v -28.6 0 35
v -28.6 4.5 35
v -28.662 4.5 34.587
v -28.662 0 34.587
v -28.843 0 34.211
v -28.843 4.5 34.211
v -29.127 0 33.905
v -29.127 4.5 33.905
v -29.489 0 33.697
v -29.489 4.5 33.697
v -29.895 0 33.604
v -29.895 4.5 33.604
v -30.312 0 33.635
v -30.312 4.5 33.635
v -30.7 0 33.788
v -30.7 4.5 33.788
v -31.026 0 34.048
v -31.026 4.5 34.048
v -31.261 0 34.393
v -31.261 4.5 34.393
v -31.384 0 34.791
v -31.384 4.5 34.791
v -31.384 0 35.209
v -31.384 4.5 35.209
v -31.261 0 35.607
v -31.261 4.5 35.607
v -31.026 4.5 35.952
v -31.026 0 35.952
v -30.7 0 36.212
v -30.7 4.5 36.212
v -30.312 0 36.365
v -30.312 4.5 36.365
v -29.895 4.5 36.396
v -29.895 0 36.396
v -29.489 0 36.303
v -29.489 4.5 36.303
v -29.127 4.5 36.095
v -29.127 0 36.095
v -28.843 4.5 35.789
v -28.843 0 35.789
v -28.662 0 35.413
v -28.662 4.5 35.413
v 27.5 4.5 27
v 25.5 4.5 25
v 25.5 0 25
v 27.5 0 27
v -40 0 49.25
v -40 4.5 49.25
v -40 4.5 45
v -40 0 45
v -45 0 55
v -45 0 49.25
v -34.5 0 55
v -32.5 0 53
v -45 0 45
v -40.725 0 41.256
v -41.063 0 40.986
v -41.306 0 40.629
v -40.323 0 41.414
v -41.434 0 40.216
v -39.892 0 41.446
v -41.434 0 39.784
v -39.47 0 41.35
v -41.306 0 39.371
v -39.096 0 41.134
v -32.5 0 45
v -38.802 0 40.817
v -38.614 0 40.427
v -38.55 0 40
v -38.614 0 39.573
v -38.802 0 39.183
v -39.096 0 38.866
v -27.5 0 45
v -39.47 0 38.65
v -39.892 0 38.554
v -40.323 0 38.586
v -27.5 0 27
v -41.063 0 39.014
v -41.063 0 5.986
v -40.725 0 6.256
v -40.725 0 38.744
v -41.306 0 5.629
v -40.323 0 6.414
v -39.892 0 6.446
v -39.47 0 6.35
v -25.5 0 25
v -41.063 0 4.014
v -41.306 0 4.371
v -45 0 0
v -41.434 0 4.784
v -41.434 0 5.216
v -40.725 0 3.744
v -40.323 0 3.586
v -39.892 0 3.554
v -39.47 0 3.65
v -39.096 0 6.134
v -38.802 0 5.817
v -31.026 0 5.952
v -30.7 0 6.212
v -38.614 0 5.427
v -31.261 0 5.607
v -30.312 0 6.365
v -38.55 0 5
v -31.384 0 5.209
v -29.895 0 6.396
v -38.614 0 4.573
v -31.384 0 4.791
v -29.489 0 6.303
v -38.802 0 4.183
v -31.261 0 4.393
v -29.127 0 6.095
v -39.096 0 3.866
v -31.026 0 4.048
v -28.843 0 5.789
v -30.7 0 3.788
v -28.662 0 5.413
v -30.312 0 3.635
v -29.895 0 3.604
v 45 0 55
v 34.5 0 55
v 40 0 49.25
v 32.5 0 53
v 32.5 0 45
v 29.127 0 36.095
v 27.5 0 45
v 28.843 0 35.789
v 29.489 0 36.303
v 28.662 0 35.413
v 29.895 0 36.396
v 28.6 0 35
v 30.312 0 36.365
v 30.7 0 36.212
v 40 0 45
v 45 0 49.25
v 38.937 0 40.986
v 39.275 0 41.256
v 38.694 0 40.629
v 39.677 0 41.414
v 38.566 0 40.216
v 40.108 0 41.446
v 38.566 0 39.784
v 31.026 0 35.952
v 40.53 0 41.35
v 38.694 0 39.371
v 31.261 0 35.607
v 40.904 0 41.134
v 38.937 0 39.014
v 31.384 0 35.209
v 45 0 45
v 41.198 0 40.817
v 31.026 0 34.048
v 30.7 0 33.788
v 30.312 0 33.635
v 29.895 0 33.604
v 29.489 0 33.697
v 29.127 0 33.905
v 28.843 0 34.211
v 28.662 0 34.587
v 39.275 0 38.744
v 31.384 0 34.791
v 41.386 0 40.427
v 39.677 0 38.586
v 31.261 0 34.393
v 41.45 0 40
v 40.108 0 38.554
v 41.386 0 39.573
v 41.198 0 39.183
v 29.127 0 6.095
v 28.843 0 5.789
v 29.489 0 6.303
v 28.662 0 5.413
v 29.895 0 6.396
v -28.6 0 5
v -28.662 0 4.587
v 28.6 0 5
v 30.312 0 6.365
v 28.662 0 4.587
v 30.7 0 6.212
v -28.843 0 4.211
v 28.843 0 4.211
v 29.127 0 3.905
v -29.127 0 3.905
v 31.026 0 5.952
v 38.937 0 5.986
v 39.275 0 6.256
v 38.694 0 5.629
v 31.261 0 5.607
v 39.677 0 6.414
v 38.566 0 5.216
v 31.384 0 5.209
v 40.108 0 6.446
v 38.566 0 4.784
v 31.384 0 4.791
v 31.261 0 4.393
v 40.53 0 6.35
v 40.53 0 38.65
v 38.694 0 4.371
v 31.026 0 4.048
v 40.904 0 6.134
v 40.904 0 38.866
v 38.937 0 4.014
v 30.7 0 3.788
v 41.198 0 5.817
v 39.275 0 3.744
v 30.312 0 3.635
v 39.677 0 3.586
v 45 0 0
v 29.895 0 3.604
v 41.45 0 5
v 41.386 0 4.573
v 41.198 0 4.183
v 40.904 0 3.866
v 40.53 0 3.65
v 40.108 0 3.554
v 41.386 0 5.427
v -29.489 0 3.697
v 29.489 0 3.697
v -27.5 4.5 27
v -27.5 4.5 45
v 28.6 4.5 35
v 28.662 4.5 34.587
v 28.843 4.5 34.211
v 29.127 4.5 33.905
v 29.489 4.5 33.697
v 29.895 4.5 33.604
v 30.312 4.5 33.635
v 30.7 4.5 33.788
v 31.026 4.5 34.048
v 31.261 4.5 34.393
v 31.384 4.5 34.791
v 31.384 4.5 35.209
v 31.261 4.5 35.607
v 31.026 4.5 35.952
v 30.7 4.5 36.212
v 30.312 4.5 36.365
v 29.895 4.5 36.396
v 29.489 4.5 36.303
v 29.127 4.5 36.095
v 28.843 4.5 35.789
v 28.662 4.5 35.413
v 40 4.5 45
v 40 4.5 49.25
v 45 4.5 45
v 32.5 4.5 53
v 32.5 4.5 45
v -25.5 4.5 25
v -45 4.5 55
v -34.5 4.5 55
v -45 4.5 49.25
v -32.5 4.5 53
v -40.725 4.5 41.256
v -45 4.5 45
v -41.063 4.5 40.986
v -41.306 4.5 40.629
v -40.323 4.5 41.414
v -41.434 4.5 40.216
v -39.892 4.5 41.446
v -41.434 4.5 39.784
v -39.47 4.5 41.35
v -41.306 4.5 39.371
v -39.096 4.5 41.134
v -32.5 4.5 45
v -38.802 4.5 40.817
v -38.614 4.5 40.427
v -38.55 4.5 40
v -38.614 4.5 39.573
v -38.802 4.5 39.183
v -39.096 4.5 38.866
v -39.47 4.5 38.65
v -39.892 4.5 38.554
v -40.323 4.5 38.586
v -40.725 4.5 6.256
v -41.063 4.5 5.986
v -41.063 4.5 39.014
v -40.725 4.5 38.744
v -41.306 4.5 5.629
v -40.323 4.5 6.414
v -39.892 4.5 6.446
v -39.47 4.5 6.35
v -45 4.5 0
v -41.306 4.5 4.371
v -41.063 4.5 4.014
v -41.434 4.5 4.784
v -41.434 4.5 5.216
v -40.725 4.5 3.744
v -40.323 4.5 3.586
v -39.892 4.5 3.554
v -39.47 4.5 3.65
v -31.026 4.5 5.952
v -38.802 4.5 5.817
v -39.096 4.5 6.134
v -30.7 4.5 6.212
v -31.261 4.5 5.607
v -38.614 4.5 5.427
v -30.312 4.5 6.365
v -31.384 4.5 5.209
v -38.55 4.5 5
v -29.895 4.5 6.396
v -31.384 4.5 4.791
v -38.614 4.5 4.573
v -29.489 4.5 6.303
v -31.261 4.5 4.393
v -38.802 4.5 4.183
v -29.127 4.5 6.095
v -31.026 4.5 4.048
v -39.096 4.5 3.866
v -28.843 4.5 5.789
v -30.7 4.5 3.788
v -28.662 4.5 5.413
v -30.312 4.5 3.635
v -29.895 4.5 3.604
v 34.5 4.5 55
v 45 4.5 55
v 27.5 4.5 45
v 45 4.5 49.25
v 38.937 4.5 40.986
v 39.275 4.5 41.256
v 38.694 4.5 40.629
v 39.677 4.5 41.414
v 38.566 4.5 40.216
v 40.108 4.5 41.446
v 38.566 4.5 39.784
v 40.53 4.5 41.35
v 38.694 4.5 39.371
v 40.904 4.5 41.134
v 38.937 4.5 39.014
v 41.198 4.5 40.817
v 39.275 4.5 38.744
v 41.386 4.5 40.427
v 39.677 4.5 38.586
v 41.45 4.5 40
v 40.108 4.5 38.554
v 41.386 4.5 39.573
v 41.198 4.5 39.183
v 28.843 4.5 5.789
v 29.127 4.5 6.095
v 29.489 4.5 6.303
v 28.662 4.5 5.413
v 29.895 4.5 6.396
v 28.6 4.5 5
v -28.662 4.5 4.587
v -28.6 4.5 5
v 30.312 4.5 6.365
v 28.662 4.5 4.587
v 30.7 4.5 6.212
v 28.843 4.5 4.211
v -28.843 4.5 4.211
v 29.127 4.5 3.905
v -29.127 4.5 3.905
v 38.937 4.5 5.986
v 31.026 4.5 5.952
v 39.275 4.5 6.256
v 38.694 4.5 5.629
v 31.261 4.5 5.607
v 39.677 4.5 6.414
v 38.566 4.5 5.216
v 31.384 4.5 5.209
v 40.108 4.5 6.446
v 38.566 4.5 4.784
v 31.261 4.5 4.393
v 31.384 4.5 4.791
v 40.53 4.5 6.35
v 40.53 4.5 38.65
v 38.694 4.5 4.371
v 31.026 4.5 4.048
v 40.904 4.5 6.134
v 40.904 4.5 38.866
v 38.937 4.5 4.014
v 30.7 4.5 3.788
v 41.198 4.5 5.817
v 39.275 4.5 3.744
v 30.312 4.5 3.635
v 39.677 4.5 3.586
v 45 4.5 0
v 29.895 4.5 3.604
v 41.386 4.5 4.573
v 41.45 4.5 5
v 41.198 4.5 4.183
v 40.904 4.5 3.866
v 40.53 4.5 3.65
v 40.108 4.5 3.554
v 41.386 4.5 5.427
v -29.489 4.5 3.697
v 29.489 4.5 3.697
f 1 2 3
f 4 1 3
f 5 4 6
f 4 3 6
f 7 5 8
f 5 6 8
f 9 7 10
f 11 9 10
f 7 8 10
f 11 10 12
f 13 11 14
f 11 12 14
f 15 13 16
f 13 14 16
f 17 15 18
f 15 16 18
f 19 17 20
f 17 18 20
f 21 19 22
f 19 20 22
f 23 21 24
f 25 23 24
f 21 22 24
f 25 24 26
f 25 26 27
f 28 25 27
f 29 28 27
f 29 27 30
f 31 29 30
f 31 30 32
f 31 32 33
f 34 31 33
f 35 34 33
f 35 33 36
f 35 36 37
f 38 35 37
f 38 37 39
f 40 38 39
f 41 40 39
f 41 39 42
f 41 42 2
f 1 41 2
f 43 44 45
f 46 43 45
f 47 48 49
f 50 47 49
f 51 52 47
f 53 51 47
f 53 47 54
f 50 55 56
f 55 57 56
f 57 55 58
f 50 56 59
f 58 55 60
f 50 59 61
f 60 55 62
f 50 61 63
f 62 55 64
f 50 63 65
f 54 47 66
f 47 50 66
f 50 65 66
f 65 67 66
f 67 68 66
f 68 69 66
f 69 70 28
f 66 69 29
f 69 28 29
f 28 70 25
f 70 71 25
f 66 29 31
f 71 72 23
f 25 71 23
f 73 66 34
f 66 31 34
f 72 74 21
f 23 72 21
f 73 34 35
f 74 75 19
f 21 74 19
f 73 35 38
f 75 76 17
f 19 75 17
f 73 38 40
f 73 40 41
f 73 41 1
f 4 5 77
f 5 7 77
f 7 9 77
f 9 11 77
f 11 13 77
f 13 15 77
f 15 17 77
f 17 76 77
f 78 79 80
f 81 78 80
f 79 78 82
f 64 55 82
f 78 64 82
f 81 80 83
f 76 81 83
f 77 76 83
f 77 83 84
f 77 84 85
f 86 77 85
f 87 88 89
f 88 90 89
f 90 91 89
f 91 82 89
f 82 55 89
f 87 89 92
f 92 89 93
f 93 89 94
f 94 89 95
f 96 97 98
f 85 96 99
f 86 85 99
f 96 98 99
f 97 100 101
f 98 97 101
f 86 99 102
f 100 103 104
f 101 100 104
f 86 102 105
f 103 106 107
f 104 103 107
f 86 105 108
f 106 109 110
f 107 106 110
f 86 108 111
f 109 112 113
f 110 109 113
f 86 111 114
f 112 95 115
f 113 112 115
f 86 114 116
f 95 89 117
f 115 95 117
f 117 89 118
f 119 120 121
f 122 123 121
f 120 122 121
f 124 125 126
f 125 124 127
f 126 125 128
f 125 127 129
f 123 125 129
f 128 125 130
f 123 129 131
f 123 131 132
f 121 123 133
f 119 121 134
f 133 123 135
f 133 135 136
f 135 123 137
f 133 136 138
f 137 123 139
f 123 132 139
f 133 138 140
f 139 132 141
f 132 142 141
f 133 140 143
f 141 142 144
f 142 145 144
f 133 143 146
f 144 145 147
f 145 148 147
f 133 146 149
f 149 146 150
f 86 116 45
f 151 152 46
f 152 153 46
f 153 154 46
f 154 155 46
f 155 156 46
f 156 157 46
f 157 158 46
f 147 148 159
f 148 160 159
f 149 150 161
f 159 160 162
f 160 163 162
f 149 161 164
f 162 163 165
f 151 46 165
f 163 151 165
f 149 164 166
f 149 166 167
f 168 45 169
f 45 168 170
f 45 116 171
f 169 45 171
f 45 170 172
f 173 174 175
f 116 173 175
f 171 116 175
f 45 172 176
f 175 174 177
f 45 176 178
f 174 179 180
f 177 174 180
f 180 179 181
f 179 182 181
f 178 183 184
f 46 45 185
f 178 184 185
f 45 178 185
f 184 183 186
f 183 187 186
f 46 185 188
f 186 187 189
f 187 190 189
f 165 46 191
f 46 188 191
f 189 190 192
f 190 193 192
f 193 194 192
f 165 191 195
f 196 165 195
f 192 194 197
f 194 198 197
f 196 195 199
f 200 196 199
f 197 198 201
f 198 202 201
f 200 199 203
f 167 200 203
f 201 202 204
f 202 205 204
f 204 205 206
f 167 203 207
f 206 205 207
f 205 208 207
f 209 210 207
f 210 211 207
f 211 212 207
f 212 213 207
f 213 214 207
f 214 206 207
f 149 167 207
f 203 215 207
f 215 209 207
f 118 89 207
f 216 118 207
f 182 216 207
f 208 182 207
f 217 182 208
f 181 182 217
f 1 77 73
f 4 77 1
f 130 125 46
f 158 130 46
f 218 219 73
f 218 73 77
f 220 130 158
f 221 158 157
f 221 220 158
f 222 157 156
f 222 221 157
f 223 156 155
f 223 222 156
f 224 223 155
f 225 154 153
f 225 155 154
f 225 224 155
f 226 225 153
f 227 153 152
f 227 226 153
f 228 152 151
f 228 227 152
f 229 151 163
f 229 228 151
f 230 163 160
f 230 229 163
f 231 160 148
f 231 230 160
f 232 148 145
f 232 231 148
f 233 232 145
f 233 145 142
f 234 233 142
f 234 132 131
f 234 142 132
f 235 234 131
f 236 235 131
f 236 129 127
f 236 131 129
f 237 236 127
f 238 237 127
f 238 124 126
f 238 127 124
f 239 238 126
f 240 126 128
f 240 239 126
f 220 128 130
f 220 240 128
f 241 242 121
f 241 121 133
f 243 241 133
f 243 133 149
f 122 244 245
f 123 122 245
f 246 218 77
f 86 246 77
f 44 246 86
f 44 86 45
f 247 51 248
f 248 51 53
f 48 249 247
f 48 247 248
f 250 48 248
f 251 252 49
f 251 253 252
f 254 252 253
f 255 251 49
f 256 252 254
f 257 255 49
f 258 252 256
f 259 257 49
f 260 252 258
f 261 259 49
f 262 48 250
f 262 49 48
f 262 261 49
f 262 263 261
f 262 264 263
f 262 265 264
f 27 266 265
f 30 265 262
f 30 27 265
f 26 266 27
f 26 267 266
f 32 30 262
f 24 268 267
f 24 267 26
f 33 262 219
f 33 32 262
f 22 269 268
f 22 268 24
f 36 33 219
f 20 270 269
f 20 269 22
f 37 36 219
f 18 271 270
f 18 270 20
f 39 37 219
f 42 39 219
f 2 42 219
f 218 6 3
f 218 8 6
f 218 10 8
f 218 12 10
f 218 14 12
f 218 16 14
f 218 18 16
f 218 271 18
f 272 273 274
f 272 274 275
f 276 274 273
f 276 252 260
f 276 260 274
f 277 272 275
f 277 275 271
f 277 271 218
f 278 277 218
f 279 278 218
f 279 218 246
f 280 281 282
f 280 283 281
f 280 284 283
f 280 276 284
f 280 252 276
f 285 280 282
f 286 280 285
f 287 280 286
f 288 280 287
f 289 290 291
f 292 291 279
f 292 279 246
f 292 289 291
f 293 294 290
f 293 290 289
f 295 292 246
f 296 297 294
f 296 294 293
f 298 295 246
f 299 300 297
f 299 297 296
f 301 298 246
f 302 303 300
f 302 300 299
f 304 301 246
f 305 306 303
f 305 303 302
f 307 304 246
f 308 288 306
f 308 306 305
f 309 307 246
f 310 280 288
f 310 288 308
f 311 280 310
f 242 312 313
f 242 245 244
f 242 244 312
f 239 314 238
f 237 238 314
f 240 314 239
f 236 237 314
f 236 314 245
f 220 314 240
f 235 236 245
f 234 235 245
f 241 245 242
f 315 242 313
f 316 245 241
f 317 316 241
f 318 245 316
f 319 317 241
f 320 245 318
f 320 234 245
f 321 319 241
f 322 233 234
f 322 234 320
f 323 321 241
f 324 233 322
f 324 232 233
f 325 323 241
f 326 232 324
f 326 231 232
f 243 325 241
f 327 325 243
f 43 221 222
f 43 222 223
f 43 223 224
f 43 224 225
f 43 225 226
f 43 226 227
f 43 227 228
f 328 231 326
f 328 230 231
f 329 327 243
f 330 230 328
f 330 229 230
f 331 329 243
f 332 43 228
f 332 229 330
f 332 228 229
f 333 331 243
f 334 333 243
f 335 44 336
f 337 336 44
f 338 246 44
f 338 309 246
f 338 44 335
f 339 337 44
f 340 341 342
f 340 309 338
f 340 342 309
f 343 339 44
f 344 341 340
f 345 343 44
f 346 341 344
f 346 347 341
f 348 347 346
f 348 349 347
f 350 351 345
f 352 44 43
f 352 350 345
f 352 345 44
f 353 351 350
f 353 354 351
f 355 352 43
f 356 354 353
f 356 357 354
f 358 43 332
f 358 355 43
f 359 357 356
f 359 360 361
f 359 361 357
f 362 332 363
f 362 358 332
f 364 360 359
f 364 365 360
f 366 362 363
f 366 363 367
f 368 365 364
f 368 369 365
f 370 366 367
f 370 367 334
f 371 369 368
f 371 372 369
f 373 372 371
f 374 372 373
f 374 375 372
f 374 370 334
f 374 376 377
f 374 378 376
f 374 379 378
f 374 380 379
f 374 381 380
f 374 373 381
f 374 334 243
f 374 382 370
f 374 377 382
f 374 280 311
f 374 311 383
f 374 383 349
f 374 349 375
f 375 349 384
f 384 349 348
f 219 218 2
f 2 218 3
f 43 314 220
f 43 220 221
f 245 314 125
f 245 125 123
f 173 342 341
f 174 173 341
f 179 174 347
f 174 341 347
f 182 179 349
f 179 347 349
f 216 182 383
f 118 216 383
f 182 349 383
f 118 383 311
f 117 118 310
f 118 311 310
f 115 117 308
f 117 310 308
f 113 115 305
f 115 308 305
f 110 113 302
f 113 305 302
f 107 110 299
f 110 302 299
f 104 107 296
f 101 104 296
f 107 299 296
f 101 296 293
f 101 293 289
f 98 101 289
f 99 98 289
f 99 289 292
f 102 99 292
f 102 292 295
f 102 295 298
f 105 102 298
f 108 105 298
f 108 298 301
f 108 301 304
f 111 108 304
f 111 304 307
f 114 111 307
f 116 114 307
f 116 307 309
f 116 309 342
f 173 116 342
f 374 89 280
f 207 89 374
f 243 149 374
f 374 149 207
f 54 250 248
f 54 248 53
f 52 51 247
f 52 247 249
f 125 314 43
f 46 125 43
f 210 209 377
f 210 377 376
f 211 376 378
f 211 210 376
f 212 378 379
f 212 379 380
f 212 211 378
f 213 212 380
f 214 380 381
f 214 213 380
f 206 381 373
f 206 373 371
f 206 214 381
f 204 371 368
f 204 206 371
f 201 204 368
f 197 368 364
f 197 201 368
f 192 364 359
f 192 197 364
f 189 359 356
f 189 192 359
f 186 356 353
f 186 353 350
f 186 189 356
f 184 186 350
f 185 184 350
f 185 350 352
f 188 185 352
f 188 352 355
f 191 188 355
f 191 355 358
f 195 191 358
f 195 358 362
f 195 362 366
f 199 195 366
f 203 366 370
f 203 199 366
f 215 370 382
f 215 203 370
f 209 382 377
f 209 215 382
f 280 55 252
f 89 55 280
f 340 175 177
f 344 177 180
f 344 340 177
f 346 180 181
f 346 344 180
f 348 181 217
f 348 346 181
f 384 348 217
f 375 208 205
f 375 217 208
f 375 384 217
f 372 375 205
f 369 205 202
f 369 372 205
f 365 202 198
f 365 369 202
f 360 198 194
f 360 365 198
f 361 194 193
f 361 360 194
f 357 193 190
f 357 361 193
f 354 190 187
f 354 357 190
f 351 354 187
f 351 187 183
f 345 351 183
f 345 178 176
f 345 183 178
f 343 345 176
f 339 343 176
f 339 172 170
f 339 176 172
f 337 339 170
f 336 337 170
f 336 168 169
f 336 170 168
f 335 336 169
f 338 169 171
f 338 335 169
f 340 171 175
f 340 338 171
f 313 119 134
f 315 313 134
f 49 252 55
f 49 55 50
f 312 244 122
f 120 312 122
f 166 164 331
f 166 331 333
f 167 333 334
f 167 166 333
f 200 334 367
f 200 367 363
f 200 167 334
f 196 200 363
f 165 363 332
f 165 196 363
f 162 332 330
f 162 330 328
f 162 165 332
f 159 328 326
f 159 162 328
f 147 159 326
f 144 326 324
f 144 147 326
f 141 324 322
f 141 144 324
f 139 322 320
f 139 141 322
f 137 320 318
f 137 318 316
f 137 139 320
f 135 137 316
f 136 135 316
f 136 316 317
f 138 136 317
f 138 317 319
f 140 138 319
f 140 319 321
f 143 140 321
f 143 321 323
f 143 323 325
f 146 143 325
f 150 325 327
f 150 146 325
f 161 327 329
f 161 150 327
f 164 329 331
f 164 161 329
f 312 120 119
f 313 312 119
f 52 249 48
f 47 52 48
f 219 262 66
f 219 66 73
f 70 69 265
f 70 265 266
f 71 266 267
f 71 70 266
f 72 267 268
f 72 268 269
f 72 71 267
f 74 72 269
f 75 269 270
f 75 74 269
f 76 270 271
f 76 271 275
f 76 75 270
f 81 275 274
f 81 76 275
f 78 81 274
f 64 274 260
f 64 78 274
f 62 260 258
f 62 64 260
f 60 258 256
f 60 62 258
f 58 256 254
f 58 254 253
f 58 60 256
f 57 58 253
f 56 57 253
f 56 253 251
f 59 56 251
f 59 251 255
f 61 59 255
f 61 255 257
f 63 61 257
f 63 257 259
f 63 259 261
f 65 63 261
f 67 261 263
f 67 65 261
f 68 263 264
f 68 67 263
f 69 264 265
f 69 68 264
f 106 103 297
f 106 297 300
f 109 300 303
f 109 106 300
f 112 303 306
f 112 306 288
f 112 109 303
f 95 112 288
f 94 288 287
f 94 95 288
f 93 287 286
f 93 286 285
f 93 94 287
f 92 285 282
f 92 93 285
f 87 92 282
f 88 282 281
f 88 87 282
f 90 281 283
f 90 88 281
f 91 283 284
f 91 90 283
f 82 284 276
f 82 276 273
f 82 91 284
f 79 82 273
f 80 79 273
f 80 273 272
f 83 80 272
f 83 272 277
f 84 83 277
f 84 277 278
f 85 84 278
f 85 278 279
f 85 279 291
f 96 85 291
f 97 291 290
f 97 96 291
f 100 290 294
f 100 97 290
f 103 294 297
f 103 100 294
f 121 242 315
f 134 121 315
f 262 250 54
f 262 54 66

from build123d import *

# Parameters (mm, degrees)
SKETCH1_W           = 90
SKETCH1_H           = 55
SKETCH1_R           = 1.45
BOSS_EXTRUDE1_DEPTH = 4.5
SKETCH2_W           = 5
SKETCH2_H           = 4.25
CUT_EXTRUDE1_DEPTH  = 5.5
SKETCH3_R           = 1.4
CUT_EXTRUDE2_DEPTH  = 5.5
SKETCH4_W           = 55
SKETCH4_H           = 30
CUT_EXTRUDE3_DEPTH  = 5.5
SKETCH5_W           = 65
SKETCH5_H           = 10
CUT_EXTRUDE4_DEPTH  = 5.5
CHAMFER1_SIZE       = 2


with BuildPart() as part:
    # Sketch1 → Boss-Extrude1 (new body)
    with BuildSketch(Plane(origin=(0, 0, 0), x_dir=(1, 0, 0), z_dir=(0, 1, 0))):
        with Locations((0, -27.5)):
            Rectangle(SKETCH1_W, SKETCH1_H)
        with Locations((-40, -40)):
            Circle(SKETCH1_R, mode=Mode.SUBTRACT)
        with Locations((-40, -5)):
            Circle(SKETCH1_R, mode=Mode.SUBTRACT)
        with Locations((40, -40)):
            Circle(SKETCH1_R, mode=Mode.SUBTRACT)
        with Locations((40, -5)):
            Circle(SKETCH1_R, mode=Mode.SUBTRACT)
    extrude(amount=BOSS_EXTRUDE1_DEPTH)

    # Sketch2 → Cut-Extrude1 (cut, through all)
    with BuildSketch(Plane(origin=(0, 4.5, 0), x_dir=(1, 0, 0), z_dir=(0, 1, 0))):
        with Locations((-42.5, -47.125)):
            Rectangle(SKETCH2_W, SKETCH2_H)
        with Locations((42.5, -47.125)):
            Rectangle(SKETCH2_W, SKETCH2_H)
    extrude(amount=-CUT_EXTRUDE1_DEPTH, mode=Mode.SUBTRACT)

    # Sketch3 → Cut-Extrude2 (cut, through all)
    with BuildSketch(Plane(origin=(0, 4.5, 0), x_dir=(1, 0, 0), z_dir=(0, 1, 0))):
        with Locations((-30, -35)):
            Circle(SKETCH3_R)
        with Locations((-30, -5)):
            Circle(SKETCH3_R)
    cut_extrude2 = extrude(amount=-CUT_EXTRUDE2_DEPTH, mode=Mode.SUBTRACT)

    # Mirror1: Cut-Extrude2 across plane
    add(cut_extrude2.mirror(Plane(origin=(0, 0, 0), x_dir=(0, 0, 1), z_dir=(1, 0, 0))), mode=Mode.SUBTRACT)

    # Sketch4 → Cut-Extrude3 (cut, through all)
    with BuildSketch(Plane(origin=(0, 4.5, 0), x_dir=(1, 0, 0), z_dir=(0, 1, 0))):
        with Locations((0, -40)):
            Rectangle(SKETCH4_W, SKETCH4_H)
    extrude(amount=-CUT_EXTRUDE3_DEPTH, mode=Mode.SUBTRACT)

    # Sketch5 → Cut-Extrude4 (cut, through all)
    with BuildSketch(Plane(origin=(0, 4.5, 0), x_dir=(1, 0, 0), z_dir=(0, 1, 0))):
        with Locations((0, -50)):
            Rectangle(SKETCH5_W, SKETCH5_H)
    extrude(amount=-CUT_EXTRUDE4_DEPTH, mode=Mode.SUBTRACT)

    # Chamfer1
    chamfer1_edges = [part.edges().sort_by_distance(p)[0] for p in [
        (32.5, 2.25, 55),
        (-32.5, 2.25, 55),
        (-27.5, 2.25, 25),
        (27.5, 2.25, 25),
    ]]
    chamfer(chamfer1_edges, length=CHAMFER1_SIZE)


solid = part.part
